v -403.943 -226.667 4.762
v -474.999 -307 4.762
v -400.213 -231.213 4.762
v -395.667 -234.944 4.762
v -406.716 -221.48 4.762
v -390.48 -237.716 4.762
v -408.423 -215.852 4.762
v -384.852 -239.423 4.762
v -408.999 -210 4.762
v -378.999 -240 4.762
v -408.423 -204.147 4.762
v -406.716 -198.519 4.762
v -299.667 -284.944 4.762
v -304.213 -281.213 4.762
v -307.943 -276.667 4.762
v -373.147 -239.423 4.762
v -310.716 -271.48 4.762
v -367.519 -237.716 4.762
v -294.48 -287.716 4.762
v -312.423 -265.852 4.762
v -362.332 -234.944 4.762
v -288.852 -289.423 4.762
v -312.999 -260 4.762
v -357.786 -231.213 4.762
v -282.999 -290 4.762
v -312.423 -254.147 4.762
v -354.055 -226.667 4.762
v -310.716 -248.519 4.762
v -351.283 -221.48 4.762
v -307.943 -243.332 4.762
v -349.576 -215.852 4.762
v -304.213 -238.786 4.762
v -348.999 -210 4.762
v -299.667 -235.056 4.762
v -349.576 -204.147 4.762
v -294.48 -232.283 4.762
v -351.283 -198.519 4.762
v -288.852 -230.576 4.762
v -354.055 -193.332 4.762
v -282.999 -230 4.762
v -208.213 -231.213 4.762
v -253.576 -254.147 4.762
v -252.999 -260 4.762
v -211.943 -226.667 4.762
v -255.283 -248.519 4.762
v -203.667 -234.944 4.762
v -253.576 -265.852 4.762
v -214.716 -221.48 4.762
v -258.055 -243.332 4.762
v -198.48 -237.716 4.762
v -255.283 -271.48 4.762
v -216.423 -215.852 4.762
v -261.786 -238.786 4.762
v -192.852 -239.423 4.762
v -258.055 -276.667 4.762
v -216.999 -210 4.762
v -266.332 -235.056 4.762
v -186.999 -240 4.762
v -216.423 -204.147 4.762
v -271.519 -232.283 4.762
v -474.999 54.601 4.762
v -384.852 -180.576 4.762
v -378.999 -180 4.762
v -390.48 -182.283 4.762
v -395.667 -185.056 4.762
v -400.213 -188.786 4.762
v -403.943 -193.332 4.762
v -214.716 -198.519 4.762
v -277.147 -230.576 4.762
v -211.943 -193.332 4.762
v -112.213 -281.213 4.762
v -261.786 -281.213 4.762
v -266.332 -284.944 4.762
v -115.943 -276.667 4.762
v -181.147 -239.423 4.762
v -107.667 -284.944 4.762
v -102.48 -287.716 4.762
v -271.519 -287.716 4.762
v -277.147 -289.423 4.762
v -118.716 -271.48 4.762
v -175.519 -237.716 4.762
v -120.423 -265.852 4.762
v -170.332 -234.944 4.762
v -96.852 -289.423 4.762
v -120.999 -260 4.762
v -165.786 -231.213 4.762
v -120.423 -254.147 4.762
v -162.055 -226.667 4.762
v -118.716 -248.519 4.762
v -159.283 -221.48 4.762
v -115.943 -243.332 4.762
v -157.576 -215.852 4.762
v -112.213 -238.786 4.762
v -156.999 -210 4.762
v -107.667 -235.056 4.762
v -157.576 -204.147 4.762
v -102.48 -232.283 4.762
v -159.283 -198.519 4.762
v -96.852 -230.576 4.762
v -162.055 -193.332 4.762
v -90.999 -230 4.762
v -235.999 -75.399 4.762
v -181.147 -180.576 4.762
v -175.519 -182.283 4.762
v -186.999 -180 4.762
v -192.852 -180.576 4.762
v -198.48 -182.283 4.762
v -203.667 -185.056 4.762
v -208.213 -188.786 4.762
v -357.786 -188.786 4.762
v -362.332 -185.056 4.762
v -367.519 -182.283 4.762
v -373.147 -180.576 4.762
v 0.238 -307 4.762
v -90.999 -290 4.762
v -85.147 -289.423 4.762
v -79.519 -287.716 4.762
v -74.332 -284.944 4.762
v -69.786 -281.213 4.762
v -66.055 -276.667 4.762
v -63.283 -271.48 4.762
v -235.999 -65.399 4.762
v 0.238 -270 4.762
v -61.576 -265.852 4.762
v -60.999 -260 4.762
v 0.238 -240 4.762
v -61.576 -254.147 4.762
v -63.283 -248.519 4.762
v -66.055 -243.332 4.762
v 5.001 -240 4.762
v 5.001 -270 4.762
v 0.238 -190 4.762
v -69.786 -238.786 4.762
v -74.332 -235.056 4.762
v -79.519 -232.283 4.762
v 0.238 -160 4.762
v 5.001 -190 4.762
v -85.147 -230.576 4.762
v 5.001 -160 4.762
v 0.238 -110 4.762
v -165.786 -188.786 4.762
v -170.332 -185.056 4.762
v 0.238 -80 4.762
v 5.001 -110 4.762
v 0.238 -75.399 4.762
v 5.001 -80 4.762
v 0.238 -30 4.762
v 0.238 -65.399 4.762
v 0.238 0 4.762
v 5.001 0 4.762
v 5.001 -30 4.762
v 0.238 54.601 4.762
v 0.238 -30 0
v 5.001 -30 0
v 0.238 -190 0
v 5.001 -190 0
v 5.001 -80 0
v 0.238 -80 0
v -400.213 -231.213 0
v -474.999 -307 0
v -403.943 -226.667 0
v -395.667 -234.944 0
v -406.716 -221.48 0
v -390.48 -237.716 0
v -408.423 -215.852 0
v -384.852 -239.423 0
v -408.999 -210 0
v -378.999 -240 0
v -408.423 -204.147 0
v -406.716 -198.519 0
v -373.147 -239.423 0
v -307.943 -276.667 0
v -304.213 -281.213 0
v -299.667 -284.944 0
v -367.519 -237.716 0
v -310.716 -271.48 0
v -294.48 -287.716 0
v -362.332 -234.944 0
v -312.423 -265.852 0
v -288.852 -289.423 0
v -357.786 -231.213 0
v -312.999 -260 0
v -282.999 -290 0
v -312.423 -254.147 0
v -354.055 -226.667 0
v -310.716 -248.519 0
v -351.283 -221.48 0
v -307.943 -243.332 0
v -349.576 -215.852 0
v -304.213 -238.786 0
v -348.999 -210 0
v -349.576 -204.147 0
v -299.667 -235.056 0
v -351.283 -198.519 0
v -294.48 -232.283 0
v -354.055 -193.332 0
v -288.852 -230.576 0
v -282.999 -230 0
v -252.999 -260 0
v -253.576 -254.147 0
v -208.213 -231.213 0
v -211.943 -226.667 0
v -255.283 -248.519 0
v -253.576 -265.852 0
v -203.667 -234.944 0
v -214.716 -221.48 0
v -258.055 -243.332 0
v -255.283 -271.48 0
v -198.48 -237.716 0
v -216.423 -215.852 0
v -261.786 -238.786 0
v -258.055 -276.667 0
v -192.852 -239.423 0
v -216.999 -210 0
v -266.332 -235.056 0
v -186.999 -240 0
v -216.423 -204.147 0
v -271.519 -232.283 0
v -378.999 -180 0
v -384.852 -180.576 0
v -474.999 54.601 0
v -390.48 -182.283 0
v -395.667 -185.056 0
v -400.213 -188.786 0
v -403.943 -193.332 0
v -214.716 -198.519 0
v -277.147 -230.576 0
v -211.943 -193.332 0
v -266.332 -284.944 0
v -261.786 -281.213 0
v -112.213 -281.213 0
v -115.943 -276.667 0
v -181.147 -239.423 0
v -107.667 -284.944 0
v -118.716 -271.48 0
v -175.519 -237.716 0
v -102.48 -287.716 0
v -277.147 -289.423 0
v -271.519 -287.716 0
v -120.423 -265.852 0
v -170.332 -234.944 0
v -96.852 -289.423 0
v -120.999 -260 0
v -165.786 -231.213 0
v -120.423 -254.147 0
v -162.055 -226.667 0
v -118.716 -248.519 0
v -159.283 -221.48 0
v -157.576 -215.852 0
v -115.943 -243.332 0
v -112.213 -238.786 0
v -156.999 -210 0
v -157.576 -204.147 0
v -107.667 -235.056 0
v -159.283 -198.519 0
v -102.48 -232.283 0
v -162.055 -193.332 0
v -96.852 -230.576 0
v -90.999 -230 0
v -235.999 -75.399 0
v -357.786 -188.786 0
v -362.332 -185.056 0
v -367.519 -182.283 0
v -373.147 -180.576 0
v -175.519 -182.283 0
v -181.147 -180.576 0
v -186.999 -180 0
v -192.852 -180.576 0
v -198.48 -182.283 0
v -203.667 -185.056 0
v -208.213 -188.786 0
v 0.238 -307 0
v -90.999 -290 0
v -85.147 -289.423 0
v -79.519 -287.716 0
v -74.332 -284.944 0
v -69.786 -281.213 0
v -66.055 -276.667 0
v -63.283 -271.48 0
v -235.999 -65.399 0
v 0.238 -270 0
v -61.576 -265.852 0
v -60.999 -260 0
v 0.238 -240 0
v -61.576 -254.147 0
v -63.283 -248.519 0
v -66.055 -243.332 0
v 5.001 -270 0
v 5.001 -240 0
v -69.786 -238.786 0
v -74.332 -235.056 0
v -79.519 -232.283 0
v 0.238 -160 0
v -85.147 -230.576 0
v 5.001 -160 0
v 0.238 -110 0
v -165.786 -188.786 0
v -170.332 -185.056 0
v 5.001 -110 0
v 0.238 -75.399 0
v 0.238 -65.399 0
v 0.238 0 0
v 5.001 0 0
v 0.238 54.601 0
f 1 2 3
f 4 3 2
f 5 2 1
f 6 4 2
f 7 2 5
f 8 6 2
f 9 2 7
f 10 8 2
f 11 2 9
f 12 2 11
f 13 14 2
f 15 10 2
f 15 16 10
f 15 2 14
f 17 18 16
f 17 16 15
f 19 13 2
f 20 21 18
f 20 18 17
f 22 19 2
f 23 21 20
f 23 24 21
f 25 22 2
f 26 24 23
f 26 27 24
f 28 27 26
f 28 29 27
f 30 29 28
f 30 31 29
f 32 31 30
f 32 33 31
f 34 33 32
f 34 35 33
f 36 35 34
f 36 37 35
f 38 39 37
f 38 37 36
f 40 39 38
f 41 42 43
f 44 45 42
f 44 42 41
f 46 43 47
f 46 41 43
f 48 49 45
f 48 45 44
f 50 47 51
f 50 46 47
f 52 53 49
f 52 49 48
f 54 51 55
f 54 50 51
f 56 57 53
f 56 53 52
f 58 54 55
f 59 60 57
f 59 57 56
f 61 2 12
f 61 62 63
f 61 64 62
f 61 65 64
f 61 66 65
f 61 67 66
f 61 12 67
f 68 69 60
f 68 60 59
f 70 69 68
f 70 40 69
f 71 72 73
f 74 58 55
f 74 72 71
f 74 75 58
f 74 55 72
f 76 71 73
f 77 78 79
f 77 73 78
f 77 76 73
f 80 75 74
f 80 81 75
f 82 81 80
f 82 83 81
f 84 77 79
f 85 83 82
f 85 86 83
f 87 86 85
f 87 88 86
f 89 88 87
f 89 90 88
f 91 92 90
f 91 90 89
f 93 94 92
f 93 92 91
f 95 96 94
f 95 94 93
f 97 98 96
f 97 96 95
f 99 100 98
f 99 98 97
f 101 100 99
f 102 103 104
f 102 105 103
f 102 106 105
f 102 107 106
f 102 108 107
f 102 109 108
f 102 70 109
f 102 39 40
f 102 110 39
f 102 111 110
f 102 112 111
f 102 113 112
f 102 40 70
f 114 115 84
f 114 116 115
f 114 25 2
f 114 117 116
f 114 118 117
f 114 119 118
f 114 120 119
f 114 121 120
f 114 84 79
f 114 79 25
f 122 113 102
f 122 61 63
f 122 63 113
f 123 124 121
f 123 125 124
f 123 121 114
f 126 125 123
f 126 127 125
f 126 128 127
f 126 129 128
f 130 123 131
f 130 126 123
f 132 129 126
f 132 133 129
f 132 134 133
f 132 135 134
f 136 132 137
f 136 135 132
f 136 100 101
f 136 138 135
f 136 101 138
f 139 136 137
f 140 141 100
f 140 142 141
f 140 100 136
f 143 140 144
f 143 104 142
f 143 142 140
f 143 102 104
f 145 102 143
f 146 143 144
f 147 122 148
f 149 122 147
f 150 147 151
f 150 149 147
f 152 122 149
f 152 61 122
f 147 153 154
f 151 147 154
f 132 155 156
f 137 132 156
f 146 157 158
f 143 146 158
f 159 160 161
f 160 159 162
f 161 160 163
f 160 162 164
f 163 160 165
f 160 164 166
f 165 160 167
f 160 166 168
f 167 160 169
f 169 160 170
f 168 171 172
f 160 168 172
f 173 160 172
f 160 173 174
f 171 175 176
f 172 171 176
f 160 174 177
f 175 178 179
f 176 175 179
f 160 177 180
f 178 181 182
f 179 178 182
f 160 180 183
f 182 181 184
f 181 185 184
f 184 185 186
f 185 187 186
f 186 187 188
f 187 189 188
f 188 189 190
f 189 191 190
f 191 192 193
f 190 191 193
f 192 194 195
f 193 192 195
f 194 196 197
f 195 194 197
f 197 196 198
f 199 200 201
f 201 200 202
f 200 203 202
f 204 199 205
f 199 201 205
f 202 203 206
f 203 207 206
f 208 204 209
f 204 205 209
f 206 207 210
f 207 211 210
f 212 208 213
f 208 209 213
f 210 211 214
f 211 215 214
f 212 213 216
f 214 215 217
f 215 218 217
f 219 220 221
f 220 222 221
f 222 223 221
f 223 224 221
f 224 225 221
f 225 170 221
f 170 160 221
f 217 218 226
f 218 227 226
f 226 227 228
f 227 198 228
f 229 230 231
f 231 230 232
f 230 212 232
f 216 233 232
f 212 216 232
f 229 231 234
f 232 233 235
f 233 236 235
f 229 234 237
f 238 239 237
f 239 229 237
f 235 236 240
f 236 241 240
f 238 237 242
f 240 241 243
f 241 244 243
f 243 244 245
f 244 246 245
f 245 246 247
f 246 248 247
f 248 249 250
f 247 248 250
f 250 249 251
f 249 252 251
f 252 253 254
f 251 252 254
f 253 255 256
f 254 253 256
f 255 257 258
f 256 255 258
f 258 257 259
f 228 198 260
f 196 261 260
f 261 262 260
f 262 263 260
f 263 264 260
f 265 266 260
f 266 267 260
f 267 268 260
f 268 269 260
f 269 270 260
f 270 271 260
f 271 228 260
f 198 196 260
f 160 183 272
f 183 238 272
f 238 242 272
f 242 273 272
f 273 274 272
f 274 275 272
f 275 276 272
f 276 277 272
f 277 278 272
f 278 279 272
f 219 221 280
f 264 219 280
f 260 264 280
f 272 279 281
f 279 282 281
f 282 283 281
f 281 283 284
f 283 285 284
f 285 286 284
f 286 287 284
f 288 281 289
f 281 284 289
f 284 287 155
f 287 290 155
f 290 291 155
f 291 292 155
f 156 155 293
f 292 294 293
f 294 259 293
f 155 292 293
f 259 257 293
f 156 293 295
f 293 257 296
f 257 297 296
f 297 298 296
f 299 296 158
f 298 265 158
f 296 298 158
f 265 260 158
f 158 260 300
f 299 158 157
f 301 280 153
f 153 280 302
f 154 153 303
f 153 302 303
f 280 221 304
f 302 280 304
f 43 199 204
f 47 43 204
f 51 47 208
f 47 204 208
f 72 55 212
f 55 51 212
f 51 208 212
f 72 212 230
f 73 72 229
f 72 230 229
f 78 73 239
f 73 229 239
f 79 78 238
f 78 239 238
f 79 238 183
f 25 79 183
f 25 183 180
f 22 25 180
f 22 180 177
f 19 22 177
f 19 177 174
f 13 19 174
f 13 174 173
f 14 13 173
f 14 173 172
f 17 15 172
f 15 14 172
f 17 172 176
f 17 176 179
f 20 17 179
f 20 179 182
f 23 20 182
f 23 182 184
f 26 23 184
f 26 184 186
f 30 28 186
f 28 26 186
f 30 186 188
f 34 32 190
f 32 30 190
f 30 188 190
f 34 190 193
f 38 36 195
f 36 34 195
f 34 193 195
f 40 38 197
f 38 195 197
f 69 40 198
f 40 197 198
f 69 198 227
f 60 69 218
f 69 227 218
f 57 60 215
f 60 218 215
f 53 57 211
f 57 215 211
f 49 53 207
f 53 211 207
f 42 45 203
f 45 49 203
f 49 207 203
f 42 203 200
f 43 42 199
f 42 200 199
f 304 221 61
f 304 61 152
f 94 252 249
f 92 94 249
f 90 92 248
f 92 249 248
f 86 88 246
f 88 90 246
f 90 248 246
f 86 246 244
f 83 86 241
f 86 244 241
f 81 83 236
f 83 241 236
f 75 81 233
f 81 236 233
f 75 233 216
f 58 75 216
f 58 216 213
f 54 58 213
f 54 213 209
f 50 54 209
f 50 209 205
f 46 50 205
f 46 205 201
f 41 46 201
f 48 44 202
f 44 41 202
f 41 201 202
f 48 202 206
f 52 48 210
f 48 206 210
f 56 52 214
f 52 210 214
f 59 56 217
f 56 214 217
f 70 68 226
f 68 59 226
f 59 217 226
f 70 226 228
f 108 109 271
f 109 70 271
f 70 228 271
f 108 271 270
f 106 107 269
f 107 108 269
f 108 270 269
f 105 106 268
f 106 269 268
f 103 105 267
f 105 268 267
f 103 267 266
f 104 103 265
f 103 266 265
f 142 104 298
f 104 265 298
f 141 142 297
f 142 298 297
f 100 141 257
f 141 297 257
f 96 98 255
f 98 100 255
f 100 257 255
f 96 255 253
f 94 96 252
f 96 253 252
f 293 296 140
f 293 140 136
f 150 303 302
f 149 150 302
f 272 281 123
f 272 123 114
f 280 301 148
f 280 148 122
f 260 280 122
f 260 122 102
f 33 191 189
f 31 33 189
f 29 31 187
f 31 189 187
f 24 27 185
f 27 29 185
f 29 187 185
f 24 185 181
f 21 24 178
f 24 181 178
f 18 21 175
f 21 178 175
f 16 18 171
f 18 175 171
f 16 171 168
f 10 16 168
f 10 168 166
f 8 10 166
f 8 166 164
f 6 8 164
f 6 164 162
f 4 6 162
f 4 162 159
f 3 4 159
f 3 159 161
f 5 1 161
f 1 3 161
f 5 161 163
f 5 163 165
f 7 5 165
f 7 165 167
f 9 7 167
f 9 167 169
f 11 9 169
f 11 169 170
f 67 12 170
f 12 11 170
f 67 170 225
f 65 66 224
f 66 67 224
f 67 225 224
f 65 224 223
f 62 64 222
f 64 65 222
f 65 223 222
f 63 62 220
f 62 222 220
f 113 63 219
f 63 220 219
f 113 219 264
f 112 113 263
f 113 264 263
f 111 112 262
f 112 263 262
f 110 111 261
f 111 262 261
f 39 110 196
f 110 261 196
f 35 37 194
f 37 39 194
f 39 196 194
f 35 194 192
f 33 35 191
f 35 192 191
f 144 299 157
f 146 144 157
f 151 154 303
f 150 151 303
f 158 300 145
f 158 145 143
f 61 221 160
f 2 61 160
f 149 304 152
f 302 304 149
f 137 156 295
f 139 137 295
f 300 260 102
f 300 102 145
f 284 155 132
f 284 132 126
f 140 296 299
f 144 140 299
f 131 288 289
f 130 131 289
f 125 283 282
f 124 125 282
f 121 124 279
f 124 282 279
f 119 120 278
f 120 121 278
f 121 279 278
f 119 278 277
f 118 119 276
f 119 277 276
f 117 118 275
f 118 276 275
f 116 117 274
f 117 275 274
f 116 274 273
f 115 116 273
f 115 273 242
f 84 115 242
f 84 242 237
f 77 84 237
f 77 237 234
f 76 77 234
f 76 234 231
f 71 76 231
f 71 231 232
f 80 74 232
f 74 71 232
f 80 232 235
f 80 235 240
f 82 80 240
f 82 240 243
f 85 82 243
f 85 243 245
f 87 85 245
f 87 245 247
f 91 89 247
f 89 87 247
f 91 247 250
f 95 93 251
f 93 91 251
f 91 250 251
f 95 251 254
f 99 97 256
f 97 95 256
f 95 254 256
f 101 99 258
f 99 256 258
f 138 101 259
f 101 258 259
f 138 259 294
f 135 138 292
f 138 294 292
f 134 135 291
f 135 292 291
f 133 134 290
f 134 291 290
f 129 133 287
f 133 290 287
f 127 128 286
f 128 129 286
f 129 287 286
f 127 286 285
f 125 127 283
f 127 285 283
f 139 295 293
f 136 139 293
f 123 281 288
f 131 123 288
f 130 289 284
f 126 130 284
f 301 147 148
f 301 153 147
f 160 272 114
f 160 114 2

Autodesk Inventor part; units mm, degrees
ref_plane "YZ Plane" through (0, 0, 0) normal (1, 0, 0) x (0, 1, 0)
ref_plane "XZ Plane" through (0, 0, 0) normal (0, 1, 0) x (-1, 0, 0)
ref_plane "XY Plane" through (0, 0, 0) normal (0, 0, 1) x (1, 0, 0)
ref_plane "Work Plane1" through (0, 0, 0) normal (0, 0, 1) x (1, 0, 0)
sketch "Sketch2" plane through (0, 0, 0) normal (0, 0, 1) x (1, 0, 0)
  line L0 (5.0006, 57.6014) -> (-474.9994, 57.6014)
  line L1 (-474.9994, 57.6014) -> (-474.9994, -309.9996)
  line L2 (-474.9994, -309.9996) -> (5.0006, -309.9996)
  line L3 (5.0006, -309.9996) -> (5.0006, 57.6014)
  line L4 (5.0006, -239.9996) -> (0.2381, -239.9996)
  line L5 (0.2381, -239.9996) -> (0.2381, -269.9996)
  line L6 (0.2381, -269.9996) -> (5.0006, -269.9996)
  line L7 (5.0006, -269.9996) -> (5.0006, -239.9996)
  line L8 (5.0006, -159.9996) -> (0.2381, -159.9996)
  line L9 (0.2381, -159.9996) -> (0.2381, -189.9996)
  line L10 (0.2381, -189.9996) -> (5.0006, -189.9996)
  line L11 (5.0006, -189.9996) -> (5.0006, -159.9996)
  line L12 (5.0006, 0.0004) -> (0.2381, 0.0004)
  line L13 (0.2381, 0.0004) -> (0.2381, -29.9996)
  line L14 (0.2381, -29.9996) -> (5.0006, -29.9996)
  line L15 (5.0006, -29.9996) -> (5.0006, 0.0004)
  line L16 (5.0006, -79.9996) -> (0.2381, -79.9996)
  line L17 (0.2381, -79.9996) -> (0.2381, -109.9996)
  line L18 (0.2381, -109.9996) -> (5.0006, -109.9996)
  line L19 (5.0006, -109.9996) -> (5.0006, -79.9996)
  line L20 (5.0006, 57.6014) -> (0.2381, 57.6014)
  line L21 (0.2381, 57.6014) -> (0.2381, -309.9996)
  line L22 (0.2381, -309.9996) -> (5.0006, -309.9996)
  line L23 (5.0006, -309.9996) -> (5.0006, 57.6014)
  line L24 (5.0006, 57.6014) -> (-474.9994, 57.6014)
  line L25 (-474.9994, 57.6014) -> (-474.9994, 54.6014)
  line L26 (-474.9994, 54.6014) -> (5.0006, 54.6014)
  line L27 (5.0006, 54.6014) -> (5.0006, 57.6014)
  line L28 (-474.9994, -309.9996) -> (5.0006, -309.9996)
  line L29 (5.0006, -309.9996) -> (5.0006, -306.9996)
  line L30 (5.0006, -306.9996) -> (-474.9994, -306.9996)
  line L31 (-474.9994, -306.9996) -> (-474.9994, -309.9996)
  line L32 (5.0006, -65.3986) -> (-474.9994, -65.3986)
  line L33 (-474.9994, -65.3986) -> (-474.9994, -75.3986)
  line L34 (-474.9994, -75.3986) -> (5.0006, -75.3986)
  line L35 (5.0006, -75.3986) -> (5.0006, -65.3986)
  line L36 (-474.9994, -65.3986) -> (-235.9994, -65.3986)
  line L37 (-235.9994, -65.3986) -> (-235.9994, -75.3986)
  line L38 (-235.9994, -75.3986) -> (-474.9994, -75.3986)
  line L39 (-474.9994, -75.3986) -> (-474.9994, -65.3986)
  circle A0 centre (-282.9994, -259.9996) radius 30
  circle A1 centre (-186.9994, -209.9996) radius 30
  circle A2 centre (-90.9994, -259.9996) radius 30
  circle A3 centre (-378.9994, -209.9996) radius 30
  point P0 (0, 0)
  point P1 (0.2381, -306.9996)
  point P2 (0.2381, -239.9996)
  point P3 (0.2381, 54.6014)
  point P4 (-235.9994, -65.3986)
  point P5 (0.2381, -65.3986)
  point P6 (0.2381, -75.3986)
  point P7 (-235.9994, -75.3986)
  dimension "d14" = 480
  dimension "d15" = 367.601
  dimension "d16" = 4.7625
  dimension "d17" = 30
  dimension "d18" = 4.7625
  dimension "d19" = 30
  dimension "d20" = 4.7625
  dimension "d21" = 30
  dimension "d22" = 4.7625
  dimension "d23" = 30
  dimension "d24" = 40
  dimension "d25" = 50
  dimension "d26" = 50
  dimension "d27" = 50
  dimension "d28" = 4.7625
  dimension "d29" = 367.601
  dimension "d30" = 3
  dimension "d31" = 3
  dimension "d34" = 480
  dimension "d35" = 10
  dimension "d36" = 123
  dimension "d37" = 239
  dimension "d38" = 10
  dimension "d39" = 60
  dimension "d40" = 60
  dimension "d41" = 60
  dimension "d42" = 60
  dimension "d43" = 50
  dimension "d45" = 50
  dimension "d46" = 100
  dimension "d47" = 100
  dimension "d48" = 96
  dimension "d49" = 96
  dimension "d50" = 96
  dimension "d51" = 96
extrude "Extrusion1" add sketch "Sketch2" along normal blind 4.7625 contours L21 L13 L32 L1 L26 | L3 L14 L13 L12 | L32 L37 L34 L1 | L34 L21 L17 L9 L5 L30 L1 | L3 L18 L17 L16 | L5 L4 L3 L6 | L3 L10 L9 L8
properties part number "leg 2" material "foam core"
